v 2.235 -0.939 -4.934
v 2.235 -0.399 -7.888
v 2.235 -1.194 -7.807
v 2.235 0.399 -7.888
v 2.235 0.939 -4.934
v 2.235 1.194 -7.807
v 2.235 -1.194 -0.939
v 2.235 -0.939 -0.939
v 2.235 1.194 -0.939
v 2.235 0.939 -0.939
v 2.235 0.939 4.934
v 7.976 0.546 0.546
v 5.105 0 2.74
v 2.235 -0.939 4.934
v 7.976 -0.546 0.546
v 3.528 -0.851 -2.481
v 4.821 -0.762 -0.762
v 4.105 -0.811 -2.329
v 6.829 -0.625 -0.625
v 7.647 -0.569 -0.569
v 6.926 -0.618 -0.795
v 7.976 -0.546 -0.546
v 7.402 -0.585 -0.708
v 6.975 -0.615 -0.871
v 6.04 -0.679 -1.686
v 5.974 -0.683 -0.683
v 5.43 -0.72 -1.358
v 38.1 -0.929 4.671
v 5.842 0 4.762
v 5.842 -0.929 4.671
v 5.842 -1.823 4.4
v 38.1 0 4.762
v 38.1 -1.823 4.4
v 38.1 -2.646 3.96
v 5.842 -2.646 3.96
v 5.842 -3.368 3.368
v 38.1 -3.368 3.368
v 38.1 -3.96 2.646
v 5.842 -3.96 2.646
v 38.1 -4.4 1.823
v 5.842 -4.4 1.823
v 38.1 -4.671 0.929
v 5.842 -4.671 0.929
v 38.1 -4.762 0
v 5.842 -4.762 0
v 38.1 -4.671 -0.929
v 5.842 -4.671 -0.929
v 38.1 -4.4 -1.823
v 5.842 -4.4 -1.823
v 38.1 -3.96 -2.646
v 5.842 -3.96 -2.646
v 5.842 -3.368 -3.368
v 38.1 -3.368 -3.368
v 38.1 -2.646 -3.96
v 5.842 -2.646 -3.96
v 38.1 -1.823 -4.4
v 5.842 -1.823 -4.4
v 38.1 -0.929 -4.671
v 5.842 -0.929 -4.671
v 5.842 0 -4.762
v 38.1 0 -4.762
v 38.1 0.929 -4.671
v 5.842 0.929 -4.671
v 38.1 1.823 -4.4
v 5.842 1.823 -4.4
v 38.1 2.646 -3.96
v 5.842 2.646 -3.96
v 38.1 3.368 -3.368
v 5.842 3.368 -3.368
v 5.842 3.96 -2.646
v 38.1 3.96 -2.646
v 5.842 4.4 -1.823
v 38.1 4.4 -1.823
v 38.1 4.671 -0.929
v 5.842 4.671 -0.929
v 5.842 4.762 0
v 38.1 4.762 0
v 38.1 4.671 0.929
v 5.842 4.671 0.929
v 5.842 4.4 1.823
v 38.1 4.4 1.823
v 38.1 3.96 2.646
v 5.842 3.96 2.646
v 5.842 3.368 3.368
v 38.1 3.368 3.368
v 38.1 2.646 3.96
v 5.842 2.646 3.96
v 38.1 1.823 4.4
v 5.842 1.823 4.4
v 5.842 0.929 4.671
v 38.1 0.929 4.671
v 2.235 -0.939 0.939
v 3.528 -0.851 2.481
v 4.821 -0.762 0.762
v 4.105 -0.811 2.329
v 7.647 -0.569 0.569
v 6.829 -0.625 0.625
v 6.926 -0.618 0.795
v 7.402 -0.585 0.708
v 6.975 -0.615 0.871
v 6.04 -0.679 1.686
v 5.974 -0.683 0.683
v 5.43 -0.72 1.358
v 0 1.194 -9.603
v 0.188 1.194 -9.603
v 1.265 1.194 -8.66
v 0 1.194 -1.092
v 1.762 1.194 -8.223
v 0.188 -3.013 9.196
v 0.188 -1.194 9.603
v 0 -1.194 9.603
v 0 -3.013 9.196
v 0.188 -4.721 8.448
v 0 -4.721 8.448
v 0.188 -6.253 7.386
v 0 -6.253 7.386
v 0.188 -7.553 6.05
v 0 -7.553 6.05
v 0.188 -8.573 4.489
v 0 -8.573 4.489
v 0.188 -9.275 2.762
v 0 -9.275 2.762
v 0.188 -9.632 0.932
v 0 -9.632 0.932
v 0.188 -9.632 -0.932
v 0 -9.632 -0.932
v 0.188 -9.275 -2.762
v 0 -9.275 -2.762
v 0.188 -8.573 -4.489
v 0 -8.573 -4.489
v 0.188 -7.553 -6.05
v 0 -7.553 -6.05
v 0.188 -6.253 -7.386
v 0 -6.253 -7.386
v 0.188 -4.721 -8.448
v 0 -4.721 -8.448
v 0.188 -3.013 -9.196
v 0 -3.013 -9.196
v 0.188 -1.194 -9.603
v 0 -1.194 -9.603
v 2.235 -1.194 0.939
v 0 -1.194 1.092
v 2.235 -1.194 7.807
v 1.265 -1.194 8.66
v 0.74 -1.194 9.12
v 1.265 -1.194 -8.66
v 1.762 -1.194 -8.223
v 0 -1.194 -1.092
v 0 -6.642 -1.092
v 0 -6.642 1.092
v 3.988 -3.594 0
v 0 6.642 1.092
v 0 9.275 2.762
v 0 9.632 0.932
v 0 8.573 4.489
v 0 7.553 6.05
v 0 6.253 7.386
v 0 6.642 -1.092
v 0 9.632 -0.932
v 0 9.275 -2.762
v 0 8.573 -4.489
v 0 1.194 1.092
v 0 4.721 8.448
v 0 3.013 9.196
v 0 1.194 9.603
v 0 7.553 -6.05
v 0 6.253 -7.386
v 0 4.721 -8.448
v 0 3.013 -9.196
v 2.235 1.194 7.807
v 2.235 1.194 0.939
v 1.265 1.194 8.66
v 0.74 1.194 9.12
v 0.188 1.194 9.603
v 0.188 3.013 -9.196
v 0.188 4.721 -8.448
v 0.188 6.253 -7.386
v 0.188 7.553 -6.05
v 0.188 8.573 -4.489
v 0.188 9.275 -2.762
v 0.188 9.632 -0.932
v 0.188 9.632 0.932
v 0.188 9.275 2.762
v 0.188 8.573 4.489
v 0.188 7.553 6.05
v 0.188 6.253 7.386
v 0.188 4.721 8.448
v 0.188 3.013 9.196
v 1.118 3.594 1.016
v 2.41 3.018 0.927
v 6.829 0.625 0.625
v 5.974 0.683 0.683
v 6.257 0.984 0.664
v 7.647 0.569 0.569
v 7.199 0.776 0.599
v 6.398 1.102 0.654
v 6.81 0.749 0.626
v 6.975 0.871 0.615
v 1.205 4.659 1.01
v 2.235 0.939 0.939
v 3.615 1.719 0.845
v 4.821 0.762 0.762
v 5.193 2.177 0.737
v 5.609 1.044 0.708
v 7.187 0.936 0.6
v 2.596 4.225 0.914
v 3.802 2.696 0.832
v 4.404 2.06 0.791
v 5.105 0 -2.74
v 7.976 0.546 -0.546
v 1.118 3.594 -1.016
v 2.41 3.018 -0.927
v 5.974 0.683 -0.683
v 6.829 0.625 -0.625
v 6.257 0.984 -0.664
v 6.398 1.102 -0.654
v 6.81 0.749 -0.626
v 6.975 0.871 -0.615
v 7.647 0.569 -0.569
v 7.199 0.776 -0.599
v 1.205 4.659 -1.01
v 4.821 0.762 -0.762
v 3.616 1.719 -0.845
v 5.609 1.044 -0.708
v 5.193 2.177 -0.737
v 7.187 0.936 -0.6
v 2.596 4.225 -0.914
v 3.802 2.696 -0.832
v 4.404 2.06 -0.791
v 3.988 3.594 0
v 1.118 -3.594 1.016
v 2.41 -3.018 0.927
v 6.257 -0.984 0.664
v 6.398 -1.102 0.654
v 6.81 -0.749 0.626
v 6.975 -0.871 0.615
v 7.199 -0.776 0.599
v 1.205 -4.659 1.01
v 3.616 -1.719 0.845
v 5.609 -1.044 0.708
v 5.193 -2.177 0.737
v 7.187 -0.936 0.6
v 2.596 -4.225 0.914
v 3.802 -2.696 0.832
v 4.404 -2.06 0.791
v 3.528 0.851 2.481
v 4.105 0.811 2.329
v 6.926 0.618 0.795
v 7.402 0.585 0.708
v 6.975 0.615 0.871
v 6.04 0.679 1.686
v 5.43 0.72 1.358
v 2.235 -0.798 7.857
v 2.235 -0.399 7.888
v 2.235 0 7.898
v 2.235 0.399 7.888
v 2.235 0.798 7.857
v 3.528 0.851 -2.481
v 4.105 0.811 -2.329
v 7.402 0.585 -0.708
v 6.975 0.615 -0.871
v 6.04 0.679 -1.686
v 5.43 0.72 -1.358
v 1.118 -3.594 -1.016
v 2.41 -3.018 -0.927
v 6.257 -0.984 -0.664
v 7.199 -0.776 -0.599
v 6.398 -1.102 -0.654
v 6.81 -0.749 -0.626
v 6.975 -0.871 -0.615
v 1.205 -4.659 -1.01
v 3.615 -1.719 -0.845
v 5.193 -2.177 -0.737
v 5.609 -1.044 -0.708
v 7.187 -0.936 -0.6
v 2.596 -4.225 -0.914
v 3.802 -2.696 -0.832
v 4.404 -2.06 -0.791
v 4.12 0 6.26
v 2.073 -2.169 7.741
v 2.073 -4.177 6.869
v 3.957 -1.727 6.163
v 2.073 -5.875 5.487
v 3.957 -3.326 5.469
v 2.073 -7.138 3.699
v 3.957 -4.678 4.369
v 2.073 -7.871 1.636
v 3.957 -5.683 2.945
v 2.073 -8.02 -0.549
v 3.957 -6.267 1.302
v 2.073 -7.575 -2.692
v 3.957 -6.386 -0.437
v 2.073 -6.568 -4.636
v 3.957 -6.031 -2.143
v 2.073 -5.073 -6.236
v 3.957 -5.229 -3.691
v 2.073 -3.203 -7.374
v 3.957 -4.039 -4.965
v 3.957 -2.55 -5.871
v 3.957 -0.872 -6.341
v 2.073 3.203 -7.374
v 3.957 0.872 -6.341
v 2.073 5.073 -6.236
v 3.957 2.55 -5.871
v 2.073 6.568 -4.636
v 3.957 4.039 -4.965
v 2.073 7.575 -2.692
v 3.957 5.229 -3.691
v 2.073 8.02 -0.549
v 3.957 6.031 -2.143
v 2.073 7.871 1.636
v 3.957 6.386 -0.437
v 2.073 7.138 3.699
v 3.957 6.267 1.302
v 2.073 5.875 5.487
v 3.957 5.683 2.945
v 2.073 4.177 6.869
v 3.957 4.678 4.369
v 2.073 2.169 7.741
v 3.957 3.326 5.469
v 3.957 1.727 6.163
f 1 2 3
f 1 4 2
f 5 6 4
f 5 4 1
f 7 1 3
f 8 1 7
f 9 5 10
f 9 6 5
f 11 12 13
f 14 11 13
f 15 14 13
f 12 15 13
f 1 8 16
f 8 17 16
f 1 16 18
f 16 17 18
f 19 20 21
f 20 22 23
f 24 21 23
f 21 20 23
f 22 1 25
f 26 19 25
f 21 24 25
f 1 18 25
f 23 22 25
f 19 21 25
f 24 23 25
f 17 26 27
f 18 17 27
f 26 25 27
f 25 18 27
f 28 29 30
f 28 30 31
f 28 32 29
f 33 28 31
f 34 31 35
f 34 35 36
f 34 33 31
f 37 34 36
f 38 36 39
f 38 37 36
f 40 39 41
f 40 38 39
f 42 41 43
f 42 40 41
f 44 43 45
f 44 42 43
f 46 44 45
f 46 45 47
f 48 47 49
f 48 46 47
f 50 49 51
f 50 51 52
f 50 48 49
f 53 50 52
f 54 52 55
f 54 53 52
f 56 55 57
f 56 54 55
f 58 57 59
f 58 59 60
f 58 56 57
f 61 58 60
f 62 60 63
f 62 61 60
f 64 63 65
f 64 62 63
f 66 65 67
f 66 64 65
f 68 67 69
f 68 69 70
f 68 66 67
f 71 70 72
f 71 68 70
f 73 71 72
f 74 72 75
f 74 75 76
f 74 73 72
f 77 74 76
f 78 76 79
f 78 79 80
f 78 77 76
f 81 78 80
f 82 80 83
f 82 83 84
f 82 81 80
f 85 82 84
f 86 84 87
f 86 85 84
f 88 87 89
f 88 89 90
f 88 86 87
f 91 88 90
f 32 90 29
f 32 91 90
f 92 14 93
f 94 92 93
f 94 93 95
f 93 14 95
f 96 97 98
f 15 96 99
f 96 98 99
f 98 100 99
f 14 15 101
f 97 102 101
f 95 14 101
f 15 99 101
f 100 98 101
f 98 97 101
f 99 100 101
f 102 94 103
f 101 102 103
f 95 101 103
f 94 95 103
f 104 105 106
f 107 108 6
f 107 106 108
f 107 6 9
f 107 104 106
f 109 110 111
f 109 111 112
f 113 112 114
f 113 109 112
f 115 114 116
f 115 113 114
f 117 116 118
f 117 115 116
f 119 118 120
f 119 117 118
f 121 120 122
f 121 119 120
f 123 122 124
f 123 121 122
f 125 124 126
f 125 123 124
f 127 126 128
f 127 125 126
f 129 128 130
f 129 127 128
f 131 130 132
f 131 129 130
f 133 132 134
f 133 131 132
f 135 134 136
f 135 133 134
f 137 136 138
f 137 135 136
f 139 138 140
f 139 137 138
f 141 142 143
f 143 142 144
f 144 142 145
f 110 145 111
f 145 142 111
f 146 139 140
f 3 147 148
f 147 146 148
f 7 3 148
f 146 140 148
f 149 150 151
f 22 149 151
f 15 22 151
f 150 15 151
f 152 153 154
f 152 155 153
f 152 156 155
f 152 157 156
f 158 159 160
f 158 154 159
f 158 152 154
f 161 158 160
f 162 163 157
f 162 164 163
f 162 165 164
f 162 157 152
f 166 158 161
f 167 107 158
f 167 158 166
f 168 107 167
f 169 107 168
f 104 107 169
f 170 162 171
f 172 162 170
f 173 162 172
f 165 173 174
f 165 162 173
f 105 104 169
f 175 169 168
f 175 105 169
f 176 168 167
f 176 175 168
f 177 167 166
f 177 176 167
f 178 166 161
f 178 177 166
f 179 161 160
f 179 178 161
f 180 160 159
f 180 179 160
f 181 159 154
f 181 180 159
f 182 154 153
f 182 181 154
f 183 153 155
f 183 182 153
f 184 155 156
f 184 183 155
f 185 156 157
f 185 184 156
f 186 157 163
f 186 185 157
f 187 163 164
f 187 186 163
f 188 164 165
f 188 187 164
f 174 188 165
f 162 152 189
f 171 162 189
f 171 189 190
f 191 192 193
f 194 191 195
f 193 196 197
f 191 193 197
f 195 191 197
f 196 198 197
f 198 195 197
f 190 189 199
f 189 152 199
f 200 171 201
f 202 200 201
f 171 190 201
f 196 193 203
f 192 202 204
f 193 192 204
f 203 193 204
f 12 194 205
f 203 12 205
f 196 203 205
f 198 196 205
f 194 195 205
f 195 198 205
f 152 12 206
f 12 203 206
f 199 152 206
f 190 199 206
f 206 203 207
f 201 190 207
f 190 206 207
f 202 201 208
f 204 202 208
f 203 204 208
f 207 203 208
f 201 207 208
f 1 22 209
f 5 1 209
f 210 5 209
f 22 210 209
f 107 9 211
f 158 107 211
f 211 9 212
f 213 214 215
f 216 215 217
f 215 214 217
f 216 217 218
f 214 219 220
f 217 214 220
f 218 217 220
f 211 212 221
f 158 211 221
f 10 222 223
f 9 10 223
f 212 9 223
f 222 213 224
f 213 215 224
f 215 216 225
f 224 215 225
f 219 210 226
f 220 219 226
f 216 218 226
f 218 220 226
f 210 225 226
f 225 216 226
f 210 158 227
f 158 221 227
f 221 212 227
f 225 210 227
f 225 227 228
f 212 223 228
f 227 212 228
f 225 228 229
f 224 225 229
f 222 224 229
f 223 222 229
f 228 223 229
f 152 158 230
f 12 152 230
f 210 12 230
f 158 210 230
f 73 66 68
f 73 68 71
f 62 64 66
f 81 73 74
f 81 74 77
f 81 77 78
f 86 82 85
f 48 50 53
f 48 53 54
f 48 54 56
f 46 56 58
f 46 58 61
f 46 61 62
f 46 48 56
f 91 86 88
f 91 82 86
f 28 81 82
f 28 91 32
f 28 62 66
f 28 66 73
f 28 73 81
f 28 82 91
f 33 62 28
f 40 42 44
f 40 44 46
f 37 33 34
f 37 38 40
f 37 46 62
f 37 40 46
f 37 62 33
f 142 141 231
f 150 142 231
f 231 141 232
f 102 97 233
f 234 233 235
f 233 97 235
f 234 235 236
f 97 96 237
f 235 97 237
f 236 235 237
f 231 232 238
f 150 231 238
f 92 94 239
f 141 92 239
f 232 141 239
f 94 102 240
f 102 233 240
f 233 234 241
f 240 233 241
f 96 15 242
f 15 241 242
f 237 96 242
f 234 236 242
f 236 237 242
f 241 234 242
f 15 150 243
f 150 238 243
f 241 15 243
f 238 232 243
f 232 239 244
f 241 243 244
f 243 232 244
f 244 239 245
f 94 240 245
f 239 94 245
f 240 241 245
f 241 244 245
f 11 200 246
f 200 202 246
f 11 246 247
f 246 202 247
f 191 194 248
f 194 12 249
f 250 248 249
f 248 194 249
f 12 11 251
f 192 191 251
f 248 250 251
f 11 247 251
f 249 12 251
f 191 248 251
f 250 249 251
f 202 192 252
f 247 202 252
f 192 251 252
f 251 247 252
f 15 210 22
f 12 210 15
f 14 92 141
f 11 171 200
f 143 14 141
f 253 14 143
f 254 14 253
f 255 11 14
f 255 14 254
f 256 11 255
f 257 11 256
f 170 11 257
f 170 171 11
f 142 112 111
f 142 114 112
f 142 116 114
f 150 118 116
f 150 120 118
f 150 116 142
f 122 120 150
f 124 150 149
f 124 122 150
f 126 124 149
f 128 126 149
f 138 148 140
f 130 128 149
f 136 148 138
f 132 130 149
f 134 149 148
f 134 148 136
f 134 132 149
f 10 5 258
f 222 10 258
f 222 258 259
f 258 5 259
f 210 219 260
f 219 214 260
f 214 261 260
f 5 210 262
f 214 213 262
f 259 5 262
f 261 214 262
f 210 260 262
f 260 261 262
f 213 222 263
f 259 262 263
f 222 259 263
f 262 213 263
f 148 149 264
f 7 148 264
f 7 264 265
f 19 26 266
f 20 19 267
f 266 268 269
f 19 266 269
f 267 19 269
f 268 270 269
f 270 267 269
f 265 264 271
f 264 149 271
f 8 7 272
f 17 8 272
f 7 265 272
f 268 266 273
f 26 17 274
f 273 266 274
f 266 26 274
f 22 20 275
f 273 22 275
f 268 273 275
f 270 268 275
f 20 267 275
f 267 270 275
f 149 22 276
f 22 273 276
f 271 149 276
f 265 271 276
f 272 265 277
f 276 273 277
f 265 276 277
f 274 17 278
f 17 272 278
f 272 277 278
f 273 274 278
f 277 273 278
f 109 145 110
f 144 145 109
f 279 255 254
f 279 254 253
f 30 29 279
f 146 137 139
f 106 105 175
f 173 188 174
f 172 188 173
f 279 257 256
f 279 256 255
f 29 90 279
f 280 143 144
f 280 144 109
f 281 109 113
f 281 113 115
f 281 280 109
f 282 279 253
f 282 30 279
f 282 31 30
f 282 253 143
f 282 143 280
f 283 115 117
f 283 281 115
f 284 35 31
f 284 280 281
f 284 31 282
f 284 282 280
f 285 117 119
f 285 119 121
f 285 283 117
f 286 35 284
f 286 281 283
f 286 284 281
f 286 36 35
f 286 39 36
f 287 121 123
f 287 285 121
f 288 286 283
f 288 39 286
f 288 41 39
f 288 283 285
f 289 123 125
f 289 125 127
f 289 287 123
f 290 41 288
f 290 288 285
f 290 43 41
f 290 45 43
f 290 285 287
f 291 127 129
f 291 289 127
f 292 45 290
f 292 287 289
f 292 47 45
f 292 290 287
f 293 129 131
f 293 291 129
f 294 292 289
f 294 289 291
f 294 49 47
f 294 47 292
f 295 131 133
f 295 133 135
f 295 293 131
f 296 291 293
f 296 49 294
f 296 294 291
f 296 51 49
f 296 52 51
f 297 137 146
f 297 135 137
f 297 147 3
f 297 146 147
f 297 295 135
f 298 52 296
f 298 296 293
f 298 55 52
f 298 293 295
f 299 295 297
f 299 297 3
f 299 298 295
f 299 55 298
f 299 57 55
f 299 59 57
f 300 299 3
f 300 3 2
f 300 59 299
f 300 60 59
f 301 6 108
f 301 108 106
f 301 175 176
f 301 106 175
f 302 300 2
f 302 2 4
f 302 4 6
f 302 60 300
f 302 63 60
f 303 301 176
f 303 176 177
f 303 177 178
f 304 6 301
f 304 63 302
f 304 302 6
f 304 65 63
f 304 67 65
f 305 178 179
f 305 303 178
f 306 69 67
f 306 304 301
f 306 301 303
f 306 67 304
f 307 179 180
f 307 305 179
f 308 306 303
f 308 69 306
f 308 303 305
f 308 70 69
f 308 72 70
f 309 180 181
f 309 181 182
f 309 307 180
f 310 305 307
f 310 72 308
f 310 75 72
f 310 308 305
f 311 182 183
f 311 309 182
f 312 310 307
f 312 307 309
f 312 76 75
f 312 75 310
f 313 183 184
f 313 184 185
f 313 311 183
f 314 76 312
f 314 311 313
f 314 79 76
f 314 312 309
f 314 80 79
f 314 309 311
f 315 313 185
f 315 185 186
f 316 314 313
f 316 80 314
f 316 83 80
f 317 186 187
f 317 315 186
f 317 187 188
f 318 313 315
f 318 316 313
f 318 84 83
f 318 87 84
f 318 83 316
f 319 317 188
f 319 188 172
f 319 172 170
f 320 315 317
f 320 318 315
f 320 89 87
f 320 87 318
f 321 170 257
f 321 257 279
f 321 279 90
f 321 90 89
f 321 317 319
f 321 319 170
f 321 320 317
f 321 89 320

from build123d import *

# Parameters (mm, degrees)
SKETCH2_W         = 19.3548
SKETCH2_H         = 2.3876
SLOT_DEPTH        = 2.2352
CIRPATTERN1_COUNT = 2
CIRPATTERN1_ANGLE = 90


with BuildPart() as part:
    # BodySke → Base-Revolve (revolve)
    with BuildSketch(Plane.XY, mode=Mode.PRIVATE) as base_revolve_sk:
        Polygon((0, 0), (0, 9.6774), (0.188054315, 9.6774), (5.842, 4.7625), (38.1, 4.7625), (38.1, 0), align=None)
    revolve(base_revolve_sk.sketch.rotate(Axis((-6.35, 0, 0), (1, 0, 0)), 90), axis=Axis((-6.35, 0, 0), (1, 0, 0)))

    # Sketch2 → Slot (cut)
    with BuildSketch(Plane.ZY):
        Rectangle(SKETCH2_W, SKETCH2_H)
    extrude(amount=-SLOT_DEPTH, mode=Mode.SUBTRACT)

    # Sketch3 → Cross section 0
    with BuildSketch(Plane.ZY):
        with BuildLine():
            Line((-1.0922, 6.6421), (1.0922, 6.6421))
            Line((1.0922, 6.6421), (1.0922, -6.6421))
            Line((1.0922, -6.6421), (-1.0922, -6.6421))
            Line((-1.0922, -6.6421), (-1.0922, 6.6421))
        make_face()
    # Sketch4 → Cross section 1
    with BuildSketch(Plane.ZY.offset(-7.9756)):
        with BuildLine():
            Line((-0.5461, 0.5461), (0.5461, 0.5461))
            Line((0.5461, 0.5461), (0.5461, -0.5461))
            Line((0.5461, -0.5461), (-0.5461, -0.5461))
            Line((-0.5461, -0.5461), (-0.5461, 0.5461))
        make_face()
    cross = loft(mode=Mode.SUBTRACT)

    # CirPattern1: Cross ×2 about axis
    cirpattern1_axis = Axis((0, 0, 0), (1, 0, 0))
    for i in range(1, CIRPATTERN1_COUNT):
        add(cross.rotate(cirpattern1_axis, i * CIRPATTERN1_ANGLE / (CIRPATTERN1_COUNT - 1)), mode=Mode.SUBTRACT)


solid = part.part
